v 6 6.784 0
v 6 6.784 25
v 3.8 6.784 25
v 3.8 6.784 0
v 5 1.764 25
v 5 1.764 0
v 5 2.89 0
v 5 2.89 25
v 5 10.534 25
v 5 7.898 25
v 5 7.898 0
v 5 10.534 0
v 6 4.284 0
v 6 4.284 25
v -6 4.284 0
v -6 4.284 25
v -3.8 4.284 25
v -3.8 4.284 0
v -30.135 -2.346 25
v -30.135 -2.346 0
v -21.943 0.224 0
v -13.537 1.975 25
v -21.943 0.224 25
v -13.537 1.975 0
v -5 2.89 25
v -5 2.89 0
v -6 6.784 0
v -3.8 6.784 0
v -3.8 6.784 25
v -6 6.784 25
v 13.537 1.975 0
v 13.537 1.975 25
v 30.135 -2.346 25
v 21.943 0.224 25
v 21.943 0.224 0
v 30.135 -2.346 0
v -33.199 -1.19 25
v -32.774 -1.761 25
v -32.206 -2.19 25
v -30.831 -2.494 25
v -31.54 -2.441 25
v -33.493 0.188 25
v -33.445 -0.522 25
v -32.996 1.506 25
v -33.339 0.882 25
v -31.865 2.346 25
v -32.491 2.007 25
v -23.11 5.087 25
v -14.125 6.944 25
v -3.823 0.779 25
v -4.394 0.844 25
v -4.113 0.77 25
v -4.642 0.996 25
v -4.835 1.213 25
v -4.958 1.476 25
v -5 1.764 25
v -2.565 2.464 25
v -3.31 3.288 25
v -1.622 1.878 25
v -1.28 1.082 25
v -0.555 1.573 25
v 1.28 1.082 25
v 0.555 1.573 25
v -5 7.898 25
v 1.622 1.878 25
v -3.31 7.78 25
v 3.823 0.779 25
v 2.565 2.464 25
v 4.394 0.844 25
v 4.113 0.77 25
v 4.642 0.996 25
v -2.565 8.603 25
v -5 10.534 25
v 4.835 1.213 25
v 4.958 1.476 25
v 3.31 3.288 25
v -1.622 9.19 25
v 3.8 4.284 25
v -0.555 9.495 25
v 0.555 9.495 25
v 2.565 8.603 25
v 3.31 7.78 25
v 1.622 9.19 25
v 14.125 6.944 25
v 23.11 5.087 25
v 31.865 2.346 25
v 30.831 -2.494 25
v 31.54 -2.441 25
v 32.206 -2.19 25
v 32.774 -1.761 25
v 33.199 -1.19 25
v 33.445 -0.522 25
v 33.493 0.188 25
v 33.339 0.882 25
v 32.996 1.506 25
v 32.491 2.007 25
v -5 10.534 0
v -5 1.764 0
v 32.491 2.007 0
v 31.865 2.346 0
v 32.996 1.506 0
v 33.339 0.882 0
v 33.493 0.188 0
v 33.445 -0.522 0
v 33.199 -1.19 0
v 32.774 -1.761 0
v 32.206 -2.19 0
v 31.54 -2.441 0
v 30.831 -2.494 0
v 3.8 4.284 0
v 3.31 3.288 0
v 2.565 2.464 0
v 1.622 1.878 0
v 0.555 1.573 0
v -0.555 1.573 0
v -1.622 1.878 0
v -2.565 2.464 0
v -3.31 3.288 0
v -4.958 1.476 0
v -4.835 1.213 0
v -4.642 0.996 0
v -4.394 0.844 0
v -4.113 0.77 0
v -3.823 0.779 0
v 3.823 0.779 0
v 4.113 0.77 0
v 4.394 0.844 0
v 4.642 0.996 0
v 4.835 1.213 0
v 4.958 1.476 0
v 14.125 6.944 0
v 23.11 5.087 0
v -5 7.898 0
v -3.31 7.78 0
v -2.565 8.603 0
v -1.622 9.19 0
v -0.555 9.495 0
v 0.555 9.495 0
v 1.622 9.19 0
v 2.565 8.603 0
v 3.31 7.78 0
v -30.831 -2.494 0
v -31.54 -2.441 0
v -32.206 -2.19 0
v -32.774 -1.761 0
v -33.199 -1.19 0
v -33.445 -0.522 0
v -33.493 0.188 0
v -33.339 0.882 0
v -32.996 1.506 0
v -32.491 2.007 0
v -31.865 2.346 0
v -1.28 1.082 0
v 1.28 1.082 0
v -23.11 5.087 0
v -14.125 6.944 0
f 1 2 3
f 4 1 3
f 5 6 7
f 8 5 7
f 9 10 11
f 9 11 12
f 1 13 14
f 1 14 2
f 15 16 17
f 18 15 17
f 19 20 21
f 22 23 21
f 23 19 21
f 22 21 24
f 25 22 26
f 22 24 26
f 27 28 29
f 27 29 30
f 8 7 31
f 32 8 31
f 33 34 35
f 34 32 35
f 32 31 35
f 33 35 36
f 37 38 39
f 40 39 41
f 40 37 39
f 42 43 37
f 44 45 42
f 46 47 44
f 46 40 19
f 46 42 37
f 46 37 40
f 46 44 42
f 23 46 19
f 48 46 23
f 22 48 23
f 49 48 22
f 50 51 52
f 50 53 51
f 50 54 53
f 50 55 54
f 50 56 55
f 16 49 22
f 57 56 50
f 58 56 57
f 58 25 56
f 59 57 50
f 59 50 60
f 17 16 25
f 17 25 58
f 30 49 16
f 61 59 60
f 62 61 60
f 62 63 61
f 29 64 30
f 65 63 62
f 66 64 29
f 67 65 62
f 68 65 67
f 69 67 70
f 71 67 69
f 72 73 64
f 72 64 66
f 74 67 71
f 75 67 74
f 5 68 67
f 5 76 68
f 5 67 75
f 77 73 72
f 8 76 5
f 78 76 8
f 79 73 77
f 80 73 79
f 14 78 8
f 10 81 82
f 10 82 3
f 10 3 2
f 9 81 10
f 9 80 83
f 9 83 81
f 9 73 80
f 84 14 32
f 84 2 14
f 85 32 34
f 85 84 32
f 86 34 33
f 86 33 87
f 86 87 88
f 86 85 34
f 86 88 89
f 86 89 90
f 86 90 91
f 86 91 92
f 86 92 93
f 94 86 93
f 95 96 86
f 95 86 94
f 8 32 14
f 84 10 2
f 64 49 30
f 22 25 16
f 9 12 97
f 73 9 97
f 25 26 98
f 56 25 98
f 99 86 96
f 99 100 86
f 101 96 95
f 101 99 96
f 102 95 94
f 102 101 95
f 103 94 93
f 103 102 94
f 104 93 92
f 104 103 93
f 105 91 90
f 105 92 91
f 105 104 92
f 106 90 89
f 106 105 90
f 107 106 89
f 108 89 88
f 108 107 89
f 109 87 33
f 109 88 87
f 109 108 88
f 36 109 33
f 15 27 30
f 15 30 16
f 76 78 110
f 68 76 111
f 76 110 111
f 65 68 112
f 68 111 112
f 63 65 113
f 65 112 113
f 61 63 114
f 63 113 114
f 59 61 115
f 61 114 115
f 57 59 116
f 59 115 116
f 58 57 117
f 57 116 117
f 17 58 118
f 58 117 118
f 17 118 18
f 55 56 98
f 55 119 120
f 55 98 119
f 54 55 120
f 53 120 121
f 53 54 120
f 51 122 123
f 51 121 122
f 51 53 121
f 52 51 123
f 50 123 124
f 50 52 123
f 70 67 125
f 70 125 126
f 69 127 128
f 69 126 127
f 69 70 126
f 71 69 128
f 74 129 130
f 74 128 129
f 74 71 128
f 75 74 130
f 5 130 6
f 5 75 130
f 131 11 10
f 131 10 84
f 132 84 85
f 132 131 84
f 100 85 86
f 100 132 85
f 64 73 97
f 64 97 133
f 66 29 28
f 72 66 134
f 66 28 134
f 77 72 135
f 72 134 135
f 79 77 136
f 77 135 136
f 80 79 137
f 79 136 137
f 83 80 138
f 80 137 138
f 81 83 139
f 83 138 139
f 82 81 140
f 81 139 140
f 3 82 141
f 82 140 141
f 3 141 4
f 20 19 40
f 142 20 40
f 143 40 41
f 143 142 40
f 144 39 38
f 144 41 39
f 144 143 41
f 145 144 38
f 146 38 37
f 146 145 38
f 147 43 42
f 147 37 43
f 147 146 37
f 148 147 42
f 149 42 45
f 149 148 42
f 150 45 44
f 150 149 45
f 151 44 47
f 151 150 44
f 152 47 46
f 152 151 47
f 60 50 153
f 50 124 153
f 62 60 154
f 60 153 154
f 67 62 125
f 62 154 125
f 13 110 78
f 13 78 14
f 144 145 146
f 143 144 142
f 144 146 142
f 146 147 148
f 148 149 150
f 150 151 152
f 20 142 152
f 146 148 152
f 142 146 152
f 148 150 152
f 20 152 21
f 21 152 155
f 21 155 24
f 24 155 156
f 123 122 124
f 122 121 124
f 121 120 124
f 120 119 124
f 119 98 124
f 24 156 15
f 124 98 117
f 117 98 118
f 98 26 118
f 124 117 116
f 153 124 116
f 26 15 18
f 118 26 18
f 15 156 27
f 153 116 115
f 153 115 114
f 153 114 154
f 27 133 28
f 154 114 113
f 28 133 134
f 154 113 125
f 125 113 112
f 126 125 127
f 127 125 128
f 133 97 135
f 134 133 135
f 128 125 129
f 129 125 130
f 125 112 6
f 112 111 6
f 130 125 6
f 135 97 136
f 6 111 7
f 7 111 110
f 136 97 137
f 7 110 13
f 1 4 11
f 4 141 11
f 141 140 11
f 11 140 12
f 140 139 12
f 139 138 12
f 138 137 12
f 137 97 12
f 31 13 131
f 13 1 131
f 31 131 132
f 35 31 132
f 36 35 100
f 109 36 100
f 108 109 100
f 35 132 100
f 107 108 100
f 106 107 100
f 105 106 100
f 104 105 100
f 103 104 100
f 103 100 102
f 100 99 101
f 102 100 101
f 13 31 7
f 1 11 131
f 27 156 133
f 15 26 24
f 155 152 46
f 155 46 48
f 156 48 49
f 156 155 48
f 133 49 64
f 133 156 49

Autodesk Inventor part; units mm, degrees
ref_plane "YZ Plane" through (0, 0, 0) normal (1, 0, 0) x (0, 1, 0)
ref_plane "XZ Plane" through (0, 0, 0) normal (0, 1, 0) x (-1, 0, 0)
ref_plane "XY Plane" through (0, 0, 0) normal (0, 0, 1) x (1, 0, 0)
sketch "Sketch1" plane through (0, 0, 0) normal (0, 0, 1) x (1, 0, 0)
  arc A0 (31, 0) -> (-31, 0) centre (0, -84.0628) ccw construction
  arc A1 (31.865, 2.3456) -> (-31.865, 2.3456) centre (0, -84.0628) ccw
  arc A2 (30.135, -2.3456) -> (-30.135, -2.3456) centre (0, -84.0628) ccw
  arc A3 (30.135, -2.3456) -> (31.865, 2.3456) centre (31, 0) ccw
  arc A4 (-31.865, 2.3456) -> (-30.135, -2.3456) centre (-31, 0) ccw
  line L0 (5, 0.5338) -> (5, 10.5338)
  line L1 (5, 10.5338) -> (-5, 10.5338)
  line L2 (-5, 10.5338) -> (-5, 0.5338)
  line L3 (-5, 0.5338) -> (5, 10.5338) construction
  line L4 (5, 0.5338) -> (-5, 10.5338) construction
  circle A5 centre (0, 5.5338) radius 4
  line L5 (-6, 4.2838) -> (6, 4.2838)
  line L6 (6, 4.2838) -> (6, 6.7838)
  line L7 (6, 6.7838) -> (-6, 6.7838)
  line L8 (-6, 6.7838) -> (-6, 4.2838)
  arc A6 (5, 0.5338) -> (-5, 0.5338) centre (0, -20.4862) ccw
  point P0 (0, 0)
  point P1 (3.7997, 4.2838)
  point P2 (-3.7997, 4.2838)
  point P3 (-3.7997, 6.7838)
  point P4 (3.7997, 6.7838)
  point P5 (5, 2.8902)
  point P6 (5, 7.898)
  point P7 (-5, 7.898)
  point P8 (-5, 2.8902)
  point P9 (3.0781, 2.9794)
  point P10 (-3.0781, 2.9794)
  dimension "d0" = 62
  dimension "d1" = 5
  dimension "d2" = 87.0966
  dimension "d3" = 10
  dimension "d4" = 10
  dimension "d5" = 8
  dimension "d6" = 12
  dimension "d7" = 2.5
  dimension "d8" = 1.25
extrude "Extrusion1" add sketch "Sketch1" along normal blind 25 contours A3 A2 L0 L5 L6 L7 A1 | L0 L7 A5 A1 | A1 A5 L2 L1 L0 | L0 A6 L2 A2 A5 | A2 A5 L5 L0 | A5 L7 L2 A1 | L2 L7 L8 L5 A2 A4 A1 | A2 L2 L5 A5
fillet "Fillet2" radius 1 1 edges at (5, 0.5338, 12.5)
fillet "Fillet3" radius 1 1 edges at (-5, 0.5338, 12.5)
properties part number "sorter_3DPrint"
